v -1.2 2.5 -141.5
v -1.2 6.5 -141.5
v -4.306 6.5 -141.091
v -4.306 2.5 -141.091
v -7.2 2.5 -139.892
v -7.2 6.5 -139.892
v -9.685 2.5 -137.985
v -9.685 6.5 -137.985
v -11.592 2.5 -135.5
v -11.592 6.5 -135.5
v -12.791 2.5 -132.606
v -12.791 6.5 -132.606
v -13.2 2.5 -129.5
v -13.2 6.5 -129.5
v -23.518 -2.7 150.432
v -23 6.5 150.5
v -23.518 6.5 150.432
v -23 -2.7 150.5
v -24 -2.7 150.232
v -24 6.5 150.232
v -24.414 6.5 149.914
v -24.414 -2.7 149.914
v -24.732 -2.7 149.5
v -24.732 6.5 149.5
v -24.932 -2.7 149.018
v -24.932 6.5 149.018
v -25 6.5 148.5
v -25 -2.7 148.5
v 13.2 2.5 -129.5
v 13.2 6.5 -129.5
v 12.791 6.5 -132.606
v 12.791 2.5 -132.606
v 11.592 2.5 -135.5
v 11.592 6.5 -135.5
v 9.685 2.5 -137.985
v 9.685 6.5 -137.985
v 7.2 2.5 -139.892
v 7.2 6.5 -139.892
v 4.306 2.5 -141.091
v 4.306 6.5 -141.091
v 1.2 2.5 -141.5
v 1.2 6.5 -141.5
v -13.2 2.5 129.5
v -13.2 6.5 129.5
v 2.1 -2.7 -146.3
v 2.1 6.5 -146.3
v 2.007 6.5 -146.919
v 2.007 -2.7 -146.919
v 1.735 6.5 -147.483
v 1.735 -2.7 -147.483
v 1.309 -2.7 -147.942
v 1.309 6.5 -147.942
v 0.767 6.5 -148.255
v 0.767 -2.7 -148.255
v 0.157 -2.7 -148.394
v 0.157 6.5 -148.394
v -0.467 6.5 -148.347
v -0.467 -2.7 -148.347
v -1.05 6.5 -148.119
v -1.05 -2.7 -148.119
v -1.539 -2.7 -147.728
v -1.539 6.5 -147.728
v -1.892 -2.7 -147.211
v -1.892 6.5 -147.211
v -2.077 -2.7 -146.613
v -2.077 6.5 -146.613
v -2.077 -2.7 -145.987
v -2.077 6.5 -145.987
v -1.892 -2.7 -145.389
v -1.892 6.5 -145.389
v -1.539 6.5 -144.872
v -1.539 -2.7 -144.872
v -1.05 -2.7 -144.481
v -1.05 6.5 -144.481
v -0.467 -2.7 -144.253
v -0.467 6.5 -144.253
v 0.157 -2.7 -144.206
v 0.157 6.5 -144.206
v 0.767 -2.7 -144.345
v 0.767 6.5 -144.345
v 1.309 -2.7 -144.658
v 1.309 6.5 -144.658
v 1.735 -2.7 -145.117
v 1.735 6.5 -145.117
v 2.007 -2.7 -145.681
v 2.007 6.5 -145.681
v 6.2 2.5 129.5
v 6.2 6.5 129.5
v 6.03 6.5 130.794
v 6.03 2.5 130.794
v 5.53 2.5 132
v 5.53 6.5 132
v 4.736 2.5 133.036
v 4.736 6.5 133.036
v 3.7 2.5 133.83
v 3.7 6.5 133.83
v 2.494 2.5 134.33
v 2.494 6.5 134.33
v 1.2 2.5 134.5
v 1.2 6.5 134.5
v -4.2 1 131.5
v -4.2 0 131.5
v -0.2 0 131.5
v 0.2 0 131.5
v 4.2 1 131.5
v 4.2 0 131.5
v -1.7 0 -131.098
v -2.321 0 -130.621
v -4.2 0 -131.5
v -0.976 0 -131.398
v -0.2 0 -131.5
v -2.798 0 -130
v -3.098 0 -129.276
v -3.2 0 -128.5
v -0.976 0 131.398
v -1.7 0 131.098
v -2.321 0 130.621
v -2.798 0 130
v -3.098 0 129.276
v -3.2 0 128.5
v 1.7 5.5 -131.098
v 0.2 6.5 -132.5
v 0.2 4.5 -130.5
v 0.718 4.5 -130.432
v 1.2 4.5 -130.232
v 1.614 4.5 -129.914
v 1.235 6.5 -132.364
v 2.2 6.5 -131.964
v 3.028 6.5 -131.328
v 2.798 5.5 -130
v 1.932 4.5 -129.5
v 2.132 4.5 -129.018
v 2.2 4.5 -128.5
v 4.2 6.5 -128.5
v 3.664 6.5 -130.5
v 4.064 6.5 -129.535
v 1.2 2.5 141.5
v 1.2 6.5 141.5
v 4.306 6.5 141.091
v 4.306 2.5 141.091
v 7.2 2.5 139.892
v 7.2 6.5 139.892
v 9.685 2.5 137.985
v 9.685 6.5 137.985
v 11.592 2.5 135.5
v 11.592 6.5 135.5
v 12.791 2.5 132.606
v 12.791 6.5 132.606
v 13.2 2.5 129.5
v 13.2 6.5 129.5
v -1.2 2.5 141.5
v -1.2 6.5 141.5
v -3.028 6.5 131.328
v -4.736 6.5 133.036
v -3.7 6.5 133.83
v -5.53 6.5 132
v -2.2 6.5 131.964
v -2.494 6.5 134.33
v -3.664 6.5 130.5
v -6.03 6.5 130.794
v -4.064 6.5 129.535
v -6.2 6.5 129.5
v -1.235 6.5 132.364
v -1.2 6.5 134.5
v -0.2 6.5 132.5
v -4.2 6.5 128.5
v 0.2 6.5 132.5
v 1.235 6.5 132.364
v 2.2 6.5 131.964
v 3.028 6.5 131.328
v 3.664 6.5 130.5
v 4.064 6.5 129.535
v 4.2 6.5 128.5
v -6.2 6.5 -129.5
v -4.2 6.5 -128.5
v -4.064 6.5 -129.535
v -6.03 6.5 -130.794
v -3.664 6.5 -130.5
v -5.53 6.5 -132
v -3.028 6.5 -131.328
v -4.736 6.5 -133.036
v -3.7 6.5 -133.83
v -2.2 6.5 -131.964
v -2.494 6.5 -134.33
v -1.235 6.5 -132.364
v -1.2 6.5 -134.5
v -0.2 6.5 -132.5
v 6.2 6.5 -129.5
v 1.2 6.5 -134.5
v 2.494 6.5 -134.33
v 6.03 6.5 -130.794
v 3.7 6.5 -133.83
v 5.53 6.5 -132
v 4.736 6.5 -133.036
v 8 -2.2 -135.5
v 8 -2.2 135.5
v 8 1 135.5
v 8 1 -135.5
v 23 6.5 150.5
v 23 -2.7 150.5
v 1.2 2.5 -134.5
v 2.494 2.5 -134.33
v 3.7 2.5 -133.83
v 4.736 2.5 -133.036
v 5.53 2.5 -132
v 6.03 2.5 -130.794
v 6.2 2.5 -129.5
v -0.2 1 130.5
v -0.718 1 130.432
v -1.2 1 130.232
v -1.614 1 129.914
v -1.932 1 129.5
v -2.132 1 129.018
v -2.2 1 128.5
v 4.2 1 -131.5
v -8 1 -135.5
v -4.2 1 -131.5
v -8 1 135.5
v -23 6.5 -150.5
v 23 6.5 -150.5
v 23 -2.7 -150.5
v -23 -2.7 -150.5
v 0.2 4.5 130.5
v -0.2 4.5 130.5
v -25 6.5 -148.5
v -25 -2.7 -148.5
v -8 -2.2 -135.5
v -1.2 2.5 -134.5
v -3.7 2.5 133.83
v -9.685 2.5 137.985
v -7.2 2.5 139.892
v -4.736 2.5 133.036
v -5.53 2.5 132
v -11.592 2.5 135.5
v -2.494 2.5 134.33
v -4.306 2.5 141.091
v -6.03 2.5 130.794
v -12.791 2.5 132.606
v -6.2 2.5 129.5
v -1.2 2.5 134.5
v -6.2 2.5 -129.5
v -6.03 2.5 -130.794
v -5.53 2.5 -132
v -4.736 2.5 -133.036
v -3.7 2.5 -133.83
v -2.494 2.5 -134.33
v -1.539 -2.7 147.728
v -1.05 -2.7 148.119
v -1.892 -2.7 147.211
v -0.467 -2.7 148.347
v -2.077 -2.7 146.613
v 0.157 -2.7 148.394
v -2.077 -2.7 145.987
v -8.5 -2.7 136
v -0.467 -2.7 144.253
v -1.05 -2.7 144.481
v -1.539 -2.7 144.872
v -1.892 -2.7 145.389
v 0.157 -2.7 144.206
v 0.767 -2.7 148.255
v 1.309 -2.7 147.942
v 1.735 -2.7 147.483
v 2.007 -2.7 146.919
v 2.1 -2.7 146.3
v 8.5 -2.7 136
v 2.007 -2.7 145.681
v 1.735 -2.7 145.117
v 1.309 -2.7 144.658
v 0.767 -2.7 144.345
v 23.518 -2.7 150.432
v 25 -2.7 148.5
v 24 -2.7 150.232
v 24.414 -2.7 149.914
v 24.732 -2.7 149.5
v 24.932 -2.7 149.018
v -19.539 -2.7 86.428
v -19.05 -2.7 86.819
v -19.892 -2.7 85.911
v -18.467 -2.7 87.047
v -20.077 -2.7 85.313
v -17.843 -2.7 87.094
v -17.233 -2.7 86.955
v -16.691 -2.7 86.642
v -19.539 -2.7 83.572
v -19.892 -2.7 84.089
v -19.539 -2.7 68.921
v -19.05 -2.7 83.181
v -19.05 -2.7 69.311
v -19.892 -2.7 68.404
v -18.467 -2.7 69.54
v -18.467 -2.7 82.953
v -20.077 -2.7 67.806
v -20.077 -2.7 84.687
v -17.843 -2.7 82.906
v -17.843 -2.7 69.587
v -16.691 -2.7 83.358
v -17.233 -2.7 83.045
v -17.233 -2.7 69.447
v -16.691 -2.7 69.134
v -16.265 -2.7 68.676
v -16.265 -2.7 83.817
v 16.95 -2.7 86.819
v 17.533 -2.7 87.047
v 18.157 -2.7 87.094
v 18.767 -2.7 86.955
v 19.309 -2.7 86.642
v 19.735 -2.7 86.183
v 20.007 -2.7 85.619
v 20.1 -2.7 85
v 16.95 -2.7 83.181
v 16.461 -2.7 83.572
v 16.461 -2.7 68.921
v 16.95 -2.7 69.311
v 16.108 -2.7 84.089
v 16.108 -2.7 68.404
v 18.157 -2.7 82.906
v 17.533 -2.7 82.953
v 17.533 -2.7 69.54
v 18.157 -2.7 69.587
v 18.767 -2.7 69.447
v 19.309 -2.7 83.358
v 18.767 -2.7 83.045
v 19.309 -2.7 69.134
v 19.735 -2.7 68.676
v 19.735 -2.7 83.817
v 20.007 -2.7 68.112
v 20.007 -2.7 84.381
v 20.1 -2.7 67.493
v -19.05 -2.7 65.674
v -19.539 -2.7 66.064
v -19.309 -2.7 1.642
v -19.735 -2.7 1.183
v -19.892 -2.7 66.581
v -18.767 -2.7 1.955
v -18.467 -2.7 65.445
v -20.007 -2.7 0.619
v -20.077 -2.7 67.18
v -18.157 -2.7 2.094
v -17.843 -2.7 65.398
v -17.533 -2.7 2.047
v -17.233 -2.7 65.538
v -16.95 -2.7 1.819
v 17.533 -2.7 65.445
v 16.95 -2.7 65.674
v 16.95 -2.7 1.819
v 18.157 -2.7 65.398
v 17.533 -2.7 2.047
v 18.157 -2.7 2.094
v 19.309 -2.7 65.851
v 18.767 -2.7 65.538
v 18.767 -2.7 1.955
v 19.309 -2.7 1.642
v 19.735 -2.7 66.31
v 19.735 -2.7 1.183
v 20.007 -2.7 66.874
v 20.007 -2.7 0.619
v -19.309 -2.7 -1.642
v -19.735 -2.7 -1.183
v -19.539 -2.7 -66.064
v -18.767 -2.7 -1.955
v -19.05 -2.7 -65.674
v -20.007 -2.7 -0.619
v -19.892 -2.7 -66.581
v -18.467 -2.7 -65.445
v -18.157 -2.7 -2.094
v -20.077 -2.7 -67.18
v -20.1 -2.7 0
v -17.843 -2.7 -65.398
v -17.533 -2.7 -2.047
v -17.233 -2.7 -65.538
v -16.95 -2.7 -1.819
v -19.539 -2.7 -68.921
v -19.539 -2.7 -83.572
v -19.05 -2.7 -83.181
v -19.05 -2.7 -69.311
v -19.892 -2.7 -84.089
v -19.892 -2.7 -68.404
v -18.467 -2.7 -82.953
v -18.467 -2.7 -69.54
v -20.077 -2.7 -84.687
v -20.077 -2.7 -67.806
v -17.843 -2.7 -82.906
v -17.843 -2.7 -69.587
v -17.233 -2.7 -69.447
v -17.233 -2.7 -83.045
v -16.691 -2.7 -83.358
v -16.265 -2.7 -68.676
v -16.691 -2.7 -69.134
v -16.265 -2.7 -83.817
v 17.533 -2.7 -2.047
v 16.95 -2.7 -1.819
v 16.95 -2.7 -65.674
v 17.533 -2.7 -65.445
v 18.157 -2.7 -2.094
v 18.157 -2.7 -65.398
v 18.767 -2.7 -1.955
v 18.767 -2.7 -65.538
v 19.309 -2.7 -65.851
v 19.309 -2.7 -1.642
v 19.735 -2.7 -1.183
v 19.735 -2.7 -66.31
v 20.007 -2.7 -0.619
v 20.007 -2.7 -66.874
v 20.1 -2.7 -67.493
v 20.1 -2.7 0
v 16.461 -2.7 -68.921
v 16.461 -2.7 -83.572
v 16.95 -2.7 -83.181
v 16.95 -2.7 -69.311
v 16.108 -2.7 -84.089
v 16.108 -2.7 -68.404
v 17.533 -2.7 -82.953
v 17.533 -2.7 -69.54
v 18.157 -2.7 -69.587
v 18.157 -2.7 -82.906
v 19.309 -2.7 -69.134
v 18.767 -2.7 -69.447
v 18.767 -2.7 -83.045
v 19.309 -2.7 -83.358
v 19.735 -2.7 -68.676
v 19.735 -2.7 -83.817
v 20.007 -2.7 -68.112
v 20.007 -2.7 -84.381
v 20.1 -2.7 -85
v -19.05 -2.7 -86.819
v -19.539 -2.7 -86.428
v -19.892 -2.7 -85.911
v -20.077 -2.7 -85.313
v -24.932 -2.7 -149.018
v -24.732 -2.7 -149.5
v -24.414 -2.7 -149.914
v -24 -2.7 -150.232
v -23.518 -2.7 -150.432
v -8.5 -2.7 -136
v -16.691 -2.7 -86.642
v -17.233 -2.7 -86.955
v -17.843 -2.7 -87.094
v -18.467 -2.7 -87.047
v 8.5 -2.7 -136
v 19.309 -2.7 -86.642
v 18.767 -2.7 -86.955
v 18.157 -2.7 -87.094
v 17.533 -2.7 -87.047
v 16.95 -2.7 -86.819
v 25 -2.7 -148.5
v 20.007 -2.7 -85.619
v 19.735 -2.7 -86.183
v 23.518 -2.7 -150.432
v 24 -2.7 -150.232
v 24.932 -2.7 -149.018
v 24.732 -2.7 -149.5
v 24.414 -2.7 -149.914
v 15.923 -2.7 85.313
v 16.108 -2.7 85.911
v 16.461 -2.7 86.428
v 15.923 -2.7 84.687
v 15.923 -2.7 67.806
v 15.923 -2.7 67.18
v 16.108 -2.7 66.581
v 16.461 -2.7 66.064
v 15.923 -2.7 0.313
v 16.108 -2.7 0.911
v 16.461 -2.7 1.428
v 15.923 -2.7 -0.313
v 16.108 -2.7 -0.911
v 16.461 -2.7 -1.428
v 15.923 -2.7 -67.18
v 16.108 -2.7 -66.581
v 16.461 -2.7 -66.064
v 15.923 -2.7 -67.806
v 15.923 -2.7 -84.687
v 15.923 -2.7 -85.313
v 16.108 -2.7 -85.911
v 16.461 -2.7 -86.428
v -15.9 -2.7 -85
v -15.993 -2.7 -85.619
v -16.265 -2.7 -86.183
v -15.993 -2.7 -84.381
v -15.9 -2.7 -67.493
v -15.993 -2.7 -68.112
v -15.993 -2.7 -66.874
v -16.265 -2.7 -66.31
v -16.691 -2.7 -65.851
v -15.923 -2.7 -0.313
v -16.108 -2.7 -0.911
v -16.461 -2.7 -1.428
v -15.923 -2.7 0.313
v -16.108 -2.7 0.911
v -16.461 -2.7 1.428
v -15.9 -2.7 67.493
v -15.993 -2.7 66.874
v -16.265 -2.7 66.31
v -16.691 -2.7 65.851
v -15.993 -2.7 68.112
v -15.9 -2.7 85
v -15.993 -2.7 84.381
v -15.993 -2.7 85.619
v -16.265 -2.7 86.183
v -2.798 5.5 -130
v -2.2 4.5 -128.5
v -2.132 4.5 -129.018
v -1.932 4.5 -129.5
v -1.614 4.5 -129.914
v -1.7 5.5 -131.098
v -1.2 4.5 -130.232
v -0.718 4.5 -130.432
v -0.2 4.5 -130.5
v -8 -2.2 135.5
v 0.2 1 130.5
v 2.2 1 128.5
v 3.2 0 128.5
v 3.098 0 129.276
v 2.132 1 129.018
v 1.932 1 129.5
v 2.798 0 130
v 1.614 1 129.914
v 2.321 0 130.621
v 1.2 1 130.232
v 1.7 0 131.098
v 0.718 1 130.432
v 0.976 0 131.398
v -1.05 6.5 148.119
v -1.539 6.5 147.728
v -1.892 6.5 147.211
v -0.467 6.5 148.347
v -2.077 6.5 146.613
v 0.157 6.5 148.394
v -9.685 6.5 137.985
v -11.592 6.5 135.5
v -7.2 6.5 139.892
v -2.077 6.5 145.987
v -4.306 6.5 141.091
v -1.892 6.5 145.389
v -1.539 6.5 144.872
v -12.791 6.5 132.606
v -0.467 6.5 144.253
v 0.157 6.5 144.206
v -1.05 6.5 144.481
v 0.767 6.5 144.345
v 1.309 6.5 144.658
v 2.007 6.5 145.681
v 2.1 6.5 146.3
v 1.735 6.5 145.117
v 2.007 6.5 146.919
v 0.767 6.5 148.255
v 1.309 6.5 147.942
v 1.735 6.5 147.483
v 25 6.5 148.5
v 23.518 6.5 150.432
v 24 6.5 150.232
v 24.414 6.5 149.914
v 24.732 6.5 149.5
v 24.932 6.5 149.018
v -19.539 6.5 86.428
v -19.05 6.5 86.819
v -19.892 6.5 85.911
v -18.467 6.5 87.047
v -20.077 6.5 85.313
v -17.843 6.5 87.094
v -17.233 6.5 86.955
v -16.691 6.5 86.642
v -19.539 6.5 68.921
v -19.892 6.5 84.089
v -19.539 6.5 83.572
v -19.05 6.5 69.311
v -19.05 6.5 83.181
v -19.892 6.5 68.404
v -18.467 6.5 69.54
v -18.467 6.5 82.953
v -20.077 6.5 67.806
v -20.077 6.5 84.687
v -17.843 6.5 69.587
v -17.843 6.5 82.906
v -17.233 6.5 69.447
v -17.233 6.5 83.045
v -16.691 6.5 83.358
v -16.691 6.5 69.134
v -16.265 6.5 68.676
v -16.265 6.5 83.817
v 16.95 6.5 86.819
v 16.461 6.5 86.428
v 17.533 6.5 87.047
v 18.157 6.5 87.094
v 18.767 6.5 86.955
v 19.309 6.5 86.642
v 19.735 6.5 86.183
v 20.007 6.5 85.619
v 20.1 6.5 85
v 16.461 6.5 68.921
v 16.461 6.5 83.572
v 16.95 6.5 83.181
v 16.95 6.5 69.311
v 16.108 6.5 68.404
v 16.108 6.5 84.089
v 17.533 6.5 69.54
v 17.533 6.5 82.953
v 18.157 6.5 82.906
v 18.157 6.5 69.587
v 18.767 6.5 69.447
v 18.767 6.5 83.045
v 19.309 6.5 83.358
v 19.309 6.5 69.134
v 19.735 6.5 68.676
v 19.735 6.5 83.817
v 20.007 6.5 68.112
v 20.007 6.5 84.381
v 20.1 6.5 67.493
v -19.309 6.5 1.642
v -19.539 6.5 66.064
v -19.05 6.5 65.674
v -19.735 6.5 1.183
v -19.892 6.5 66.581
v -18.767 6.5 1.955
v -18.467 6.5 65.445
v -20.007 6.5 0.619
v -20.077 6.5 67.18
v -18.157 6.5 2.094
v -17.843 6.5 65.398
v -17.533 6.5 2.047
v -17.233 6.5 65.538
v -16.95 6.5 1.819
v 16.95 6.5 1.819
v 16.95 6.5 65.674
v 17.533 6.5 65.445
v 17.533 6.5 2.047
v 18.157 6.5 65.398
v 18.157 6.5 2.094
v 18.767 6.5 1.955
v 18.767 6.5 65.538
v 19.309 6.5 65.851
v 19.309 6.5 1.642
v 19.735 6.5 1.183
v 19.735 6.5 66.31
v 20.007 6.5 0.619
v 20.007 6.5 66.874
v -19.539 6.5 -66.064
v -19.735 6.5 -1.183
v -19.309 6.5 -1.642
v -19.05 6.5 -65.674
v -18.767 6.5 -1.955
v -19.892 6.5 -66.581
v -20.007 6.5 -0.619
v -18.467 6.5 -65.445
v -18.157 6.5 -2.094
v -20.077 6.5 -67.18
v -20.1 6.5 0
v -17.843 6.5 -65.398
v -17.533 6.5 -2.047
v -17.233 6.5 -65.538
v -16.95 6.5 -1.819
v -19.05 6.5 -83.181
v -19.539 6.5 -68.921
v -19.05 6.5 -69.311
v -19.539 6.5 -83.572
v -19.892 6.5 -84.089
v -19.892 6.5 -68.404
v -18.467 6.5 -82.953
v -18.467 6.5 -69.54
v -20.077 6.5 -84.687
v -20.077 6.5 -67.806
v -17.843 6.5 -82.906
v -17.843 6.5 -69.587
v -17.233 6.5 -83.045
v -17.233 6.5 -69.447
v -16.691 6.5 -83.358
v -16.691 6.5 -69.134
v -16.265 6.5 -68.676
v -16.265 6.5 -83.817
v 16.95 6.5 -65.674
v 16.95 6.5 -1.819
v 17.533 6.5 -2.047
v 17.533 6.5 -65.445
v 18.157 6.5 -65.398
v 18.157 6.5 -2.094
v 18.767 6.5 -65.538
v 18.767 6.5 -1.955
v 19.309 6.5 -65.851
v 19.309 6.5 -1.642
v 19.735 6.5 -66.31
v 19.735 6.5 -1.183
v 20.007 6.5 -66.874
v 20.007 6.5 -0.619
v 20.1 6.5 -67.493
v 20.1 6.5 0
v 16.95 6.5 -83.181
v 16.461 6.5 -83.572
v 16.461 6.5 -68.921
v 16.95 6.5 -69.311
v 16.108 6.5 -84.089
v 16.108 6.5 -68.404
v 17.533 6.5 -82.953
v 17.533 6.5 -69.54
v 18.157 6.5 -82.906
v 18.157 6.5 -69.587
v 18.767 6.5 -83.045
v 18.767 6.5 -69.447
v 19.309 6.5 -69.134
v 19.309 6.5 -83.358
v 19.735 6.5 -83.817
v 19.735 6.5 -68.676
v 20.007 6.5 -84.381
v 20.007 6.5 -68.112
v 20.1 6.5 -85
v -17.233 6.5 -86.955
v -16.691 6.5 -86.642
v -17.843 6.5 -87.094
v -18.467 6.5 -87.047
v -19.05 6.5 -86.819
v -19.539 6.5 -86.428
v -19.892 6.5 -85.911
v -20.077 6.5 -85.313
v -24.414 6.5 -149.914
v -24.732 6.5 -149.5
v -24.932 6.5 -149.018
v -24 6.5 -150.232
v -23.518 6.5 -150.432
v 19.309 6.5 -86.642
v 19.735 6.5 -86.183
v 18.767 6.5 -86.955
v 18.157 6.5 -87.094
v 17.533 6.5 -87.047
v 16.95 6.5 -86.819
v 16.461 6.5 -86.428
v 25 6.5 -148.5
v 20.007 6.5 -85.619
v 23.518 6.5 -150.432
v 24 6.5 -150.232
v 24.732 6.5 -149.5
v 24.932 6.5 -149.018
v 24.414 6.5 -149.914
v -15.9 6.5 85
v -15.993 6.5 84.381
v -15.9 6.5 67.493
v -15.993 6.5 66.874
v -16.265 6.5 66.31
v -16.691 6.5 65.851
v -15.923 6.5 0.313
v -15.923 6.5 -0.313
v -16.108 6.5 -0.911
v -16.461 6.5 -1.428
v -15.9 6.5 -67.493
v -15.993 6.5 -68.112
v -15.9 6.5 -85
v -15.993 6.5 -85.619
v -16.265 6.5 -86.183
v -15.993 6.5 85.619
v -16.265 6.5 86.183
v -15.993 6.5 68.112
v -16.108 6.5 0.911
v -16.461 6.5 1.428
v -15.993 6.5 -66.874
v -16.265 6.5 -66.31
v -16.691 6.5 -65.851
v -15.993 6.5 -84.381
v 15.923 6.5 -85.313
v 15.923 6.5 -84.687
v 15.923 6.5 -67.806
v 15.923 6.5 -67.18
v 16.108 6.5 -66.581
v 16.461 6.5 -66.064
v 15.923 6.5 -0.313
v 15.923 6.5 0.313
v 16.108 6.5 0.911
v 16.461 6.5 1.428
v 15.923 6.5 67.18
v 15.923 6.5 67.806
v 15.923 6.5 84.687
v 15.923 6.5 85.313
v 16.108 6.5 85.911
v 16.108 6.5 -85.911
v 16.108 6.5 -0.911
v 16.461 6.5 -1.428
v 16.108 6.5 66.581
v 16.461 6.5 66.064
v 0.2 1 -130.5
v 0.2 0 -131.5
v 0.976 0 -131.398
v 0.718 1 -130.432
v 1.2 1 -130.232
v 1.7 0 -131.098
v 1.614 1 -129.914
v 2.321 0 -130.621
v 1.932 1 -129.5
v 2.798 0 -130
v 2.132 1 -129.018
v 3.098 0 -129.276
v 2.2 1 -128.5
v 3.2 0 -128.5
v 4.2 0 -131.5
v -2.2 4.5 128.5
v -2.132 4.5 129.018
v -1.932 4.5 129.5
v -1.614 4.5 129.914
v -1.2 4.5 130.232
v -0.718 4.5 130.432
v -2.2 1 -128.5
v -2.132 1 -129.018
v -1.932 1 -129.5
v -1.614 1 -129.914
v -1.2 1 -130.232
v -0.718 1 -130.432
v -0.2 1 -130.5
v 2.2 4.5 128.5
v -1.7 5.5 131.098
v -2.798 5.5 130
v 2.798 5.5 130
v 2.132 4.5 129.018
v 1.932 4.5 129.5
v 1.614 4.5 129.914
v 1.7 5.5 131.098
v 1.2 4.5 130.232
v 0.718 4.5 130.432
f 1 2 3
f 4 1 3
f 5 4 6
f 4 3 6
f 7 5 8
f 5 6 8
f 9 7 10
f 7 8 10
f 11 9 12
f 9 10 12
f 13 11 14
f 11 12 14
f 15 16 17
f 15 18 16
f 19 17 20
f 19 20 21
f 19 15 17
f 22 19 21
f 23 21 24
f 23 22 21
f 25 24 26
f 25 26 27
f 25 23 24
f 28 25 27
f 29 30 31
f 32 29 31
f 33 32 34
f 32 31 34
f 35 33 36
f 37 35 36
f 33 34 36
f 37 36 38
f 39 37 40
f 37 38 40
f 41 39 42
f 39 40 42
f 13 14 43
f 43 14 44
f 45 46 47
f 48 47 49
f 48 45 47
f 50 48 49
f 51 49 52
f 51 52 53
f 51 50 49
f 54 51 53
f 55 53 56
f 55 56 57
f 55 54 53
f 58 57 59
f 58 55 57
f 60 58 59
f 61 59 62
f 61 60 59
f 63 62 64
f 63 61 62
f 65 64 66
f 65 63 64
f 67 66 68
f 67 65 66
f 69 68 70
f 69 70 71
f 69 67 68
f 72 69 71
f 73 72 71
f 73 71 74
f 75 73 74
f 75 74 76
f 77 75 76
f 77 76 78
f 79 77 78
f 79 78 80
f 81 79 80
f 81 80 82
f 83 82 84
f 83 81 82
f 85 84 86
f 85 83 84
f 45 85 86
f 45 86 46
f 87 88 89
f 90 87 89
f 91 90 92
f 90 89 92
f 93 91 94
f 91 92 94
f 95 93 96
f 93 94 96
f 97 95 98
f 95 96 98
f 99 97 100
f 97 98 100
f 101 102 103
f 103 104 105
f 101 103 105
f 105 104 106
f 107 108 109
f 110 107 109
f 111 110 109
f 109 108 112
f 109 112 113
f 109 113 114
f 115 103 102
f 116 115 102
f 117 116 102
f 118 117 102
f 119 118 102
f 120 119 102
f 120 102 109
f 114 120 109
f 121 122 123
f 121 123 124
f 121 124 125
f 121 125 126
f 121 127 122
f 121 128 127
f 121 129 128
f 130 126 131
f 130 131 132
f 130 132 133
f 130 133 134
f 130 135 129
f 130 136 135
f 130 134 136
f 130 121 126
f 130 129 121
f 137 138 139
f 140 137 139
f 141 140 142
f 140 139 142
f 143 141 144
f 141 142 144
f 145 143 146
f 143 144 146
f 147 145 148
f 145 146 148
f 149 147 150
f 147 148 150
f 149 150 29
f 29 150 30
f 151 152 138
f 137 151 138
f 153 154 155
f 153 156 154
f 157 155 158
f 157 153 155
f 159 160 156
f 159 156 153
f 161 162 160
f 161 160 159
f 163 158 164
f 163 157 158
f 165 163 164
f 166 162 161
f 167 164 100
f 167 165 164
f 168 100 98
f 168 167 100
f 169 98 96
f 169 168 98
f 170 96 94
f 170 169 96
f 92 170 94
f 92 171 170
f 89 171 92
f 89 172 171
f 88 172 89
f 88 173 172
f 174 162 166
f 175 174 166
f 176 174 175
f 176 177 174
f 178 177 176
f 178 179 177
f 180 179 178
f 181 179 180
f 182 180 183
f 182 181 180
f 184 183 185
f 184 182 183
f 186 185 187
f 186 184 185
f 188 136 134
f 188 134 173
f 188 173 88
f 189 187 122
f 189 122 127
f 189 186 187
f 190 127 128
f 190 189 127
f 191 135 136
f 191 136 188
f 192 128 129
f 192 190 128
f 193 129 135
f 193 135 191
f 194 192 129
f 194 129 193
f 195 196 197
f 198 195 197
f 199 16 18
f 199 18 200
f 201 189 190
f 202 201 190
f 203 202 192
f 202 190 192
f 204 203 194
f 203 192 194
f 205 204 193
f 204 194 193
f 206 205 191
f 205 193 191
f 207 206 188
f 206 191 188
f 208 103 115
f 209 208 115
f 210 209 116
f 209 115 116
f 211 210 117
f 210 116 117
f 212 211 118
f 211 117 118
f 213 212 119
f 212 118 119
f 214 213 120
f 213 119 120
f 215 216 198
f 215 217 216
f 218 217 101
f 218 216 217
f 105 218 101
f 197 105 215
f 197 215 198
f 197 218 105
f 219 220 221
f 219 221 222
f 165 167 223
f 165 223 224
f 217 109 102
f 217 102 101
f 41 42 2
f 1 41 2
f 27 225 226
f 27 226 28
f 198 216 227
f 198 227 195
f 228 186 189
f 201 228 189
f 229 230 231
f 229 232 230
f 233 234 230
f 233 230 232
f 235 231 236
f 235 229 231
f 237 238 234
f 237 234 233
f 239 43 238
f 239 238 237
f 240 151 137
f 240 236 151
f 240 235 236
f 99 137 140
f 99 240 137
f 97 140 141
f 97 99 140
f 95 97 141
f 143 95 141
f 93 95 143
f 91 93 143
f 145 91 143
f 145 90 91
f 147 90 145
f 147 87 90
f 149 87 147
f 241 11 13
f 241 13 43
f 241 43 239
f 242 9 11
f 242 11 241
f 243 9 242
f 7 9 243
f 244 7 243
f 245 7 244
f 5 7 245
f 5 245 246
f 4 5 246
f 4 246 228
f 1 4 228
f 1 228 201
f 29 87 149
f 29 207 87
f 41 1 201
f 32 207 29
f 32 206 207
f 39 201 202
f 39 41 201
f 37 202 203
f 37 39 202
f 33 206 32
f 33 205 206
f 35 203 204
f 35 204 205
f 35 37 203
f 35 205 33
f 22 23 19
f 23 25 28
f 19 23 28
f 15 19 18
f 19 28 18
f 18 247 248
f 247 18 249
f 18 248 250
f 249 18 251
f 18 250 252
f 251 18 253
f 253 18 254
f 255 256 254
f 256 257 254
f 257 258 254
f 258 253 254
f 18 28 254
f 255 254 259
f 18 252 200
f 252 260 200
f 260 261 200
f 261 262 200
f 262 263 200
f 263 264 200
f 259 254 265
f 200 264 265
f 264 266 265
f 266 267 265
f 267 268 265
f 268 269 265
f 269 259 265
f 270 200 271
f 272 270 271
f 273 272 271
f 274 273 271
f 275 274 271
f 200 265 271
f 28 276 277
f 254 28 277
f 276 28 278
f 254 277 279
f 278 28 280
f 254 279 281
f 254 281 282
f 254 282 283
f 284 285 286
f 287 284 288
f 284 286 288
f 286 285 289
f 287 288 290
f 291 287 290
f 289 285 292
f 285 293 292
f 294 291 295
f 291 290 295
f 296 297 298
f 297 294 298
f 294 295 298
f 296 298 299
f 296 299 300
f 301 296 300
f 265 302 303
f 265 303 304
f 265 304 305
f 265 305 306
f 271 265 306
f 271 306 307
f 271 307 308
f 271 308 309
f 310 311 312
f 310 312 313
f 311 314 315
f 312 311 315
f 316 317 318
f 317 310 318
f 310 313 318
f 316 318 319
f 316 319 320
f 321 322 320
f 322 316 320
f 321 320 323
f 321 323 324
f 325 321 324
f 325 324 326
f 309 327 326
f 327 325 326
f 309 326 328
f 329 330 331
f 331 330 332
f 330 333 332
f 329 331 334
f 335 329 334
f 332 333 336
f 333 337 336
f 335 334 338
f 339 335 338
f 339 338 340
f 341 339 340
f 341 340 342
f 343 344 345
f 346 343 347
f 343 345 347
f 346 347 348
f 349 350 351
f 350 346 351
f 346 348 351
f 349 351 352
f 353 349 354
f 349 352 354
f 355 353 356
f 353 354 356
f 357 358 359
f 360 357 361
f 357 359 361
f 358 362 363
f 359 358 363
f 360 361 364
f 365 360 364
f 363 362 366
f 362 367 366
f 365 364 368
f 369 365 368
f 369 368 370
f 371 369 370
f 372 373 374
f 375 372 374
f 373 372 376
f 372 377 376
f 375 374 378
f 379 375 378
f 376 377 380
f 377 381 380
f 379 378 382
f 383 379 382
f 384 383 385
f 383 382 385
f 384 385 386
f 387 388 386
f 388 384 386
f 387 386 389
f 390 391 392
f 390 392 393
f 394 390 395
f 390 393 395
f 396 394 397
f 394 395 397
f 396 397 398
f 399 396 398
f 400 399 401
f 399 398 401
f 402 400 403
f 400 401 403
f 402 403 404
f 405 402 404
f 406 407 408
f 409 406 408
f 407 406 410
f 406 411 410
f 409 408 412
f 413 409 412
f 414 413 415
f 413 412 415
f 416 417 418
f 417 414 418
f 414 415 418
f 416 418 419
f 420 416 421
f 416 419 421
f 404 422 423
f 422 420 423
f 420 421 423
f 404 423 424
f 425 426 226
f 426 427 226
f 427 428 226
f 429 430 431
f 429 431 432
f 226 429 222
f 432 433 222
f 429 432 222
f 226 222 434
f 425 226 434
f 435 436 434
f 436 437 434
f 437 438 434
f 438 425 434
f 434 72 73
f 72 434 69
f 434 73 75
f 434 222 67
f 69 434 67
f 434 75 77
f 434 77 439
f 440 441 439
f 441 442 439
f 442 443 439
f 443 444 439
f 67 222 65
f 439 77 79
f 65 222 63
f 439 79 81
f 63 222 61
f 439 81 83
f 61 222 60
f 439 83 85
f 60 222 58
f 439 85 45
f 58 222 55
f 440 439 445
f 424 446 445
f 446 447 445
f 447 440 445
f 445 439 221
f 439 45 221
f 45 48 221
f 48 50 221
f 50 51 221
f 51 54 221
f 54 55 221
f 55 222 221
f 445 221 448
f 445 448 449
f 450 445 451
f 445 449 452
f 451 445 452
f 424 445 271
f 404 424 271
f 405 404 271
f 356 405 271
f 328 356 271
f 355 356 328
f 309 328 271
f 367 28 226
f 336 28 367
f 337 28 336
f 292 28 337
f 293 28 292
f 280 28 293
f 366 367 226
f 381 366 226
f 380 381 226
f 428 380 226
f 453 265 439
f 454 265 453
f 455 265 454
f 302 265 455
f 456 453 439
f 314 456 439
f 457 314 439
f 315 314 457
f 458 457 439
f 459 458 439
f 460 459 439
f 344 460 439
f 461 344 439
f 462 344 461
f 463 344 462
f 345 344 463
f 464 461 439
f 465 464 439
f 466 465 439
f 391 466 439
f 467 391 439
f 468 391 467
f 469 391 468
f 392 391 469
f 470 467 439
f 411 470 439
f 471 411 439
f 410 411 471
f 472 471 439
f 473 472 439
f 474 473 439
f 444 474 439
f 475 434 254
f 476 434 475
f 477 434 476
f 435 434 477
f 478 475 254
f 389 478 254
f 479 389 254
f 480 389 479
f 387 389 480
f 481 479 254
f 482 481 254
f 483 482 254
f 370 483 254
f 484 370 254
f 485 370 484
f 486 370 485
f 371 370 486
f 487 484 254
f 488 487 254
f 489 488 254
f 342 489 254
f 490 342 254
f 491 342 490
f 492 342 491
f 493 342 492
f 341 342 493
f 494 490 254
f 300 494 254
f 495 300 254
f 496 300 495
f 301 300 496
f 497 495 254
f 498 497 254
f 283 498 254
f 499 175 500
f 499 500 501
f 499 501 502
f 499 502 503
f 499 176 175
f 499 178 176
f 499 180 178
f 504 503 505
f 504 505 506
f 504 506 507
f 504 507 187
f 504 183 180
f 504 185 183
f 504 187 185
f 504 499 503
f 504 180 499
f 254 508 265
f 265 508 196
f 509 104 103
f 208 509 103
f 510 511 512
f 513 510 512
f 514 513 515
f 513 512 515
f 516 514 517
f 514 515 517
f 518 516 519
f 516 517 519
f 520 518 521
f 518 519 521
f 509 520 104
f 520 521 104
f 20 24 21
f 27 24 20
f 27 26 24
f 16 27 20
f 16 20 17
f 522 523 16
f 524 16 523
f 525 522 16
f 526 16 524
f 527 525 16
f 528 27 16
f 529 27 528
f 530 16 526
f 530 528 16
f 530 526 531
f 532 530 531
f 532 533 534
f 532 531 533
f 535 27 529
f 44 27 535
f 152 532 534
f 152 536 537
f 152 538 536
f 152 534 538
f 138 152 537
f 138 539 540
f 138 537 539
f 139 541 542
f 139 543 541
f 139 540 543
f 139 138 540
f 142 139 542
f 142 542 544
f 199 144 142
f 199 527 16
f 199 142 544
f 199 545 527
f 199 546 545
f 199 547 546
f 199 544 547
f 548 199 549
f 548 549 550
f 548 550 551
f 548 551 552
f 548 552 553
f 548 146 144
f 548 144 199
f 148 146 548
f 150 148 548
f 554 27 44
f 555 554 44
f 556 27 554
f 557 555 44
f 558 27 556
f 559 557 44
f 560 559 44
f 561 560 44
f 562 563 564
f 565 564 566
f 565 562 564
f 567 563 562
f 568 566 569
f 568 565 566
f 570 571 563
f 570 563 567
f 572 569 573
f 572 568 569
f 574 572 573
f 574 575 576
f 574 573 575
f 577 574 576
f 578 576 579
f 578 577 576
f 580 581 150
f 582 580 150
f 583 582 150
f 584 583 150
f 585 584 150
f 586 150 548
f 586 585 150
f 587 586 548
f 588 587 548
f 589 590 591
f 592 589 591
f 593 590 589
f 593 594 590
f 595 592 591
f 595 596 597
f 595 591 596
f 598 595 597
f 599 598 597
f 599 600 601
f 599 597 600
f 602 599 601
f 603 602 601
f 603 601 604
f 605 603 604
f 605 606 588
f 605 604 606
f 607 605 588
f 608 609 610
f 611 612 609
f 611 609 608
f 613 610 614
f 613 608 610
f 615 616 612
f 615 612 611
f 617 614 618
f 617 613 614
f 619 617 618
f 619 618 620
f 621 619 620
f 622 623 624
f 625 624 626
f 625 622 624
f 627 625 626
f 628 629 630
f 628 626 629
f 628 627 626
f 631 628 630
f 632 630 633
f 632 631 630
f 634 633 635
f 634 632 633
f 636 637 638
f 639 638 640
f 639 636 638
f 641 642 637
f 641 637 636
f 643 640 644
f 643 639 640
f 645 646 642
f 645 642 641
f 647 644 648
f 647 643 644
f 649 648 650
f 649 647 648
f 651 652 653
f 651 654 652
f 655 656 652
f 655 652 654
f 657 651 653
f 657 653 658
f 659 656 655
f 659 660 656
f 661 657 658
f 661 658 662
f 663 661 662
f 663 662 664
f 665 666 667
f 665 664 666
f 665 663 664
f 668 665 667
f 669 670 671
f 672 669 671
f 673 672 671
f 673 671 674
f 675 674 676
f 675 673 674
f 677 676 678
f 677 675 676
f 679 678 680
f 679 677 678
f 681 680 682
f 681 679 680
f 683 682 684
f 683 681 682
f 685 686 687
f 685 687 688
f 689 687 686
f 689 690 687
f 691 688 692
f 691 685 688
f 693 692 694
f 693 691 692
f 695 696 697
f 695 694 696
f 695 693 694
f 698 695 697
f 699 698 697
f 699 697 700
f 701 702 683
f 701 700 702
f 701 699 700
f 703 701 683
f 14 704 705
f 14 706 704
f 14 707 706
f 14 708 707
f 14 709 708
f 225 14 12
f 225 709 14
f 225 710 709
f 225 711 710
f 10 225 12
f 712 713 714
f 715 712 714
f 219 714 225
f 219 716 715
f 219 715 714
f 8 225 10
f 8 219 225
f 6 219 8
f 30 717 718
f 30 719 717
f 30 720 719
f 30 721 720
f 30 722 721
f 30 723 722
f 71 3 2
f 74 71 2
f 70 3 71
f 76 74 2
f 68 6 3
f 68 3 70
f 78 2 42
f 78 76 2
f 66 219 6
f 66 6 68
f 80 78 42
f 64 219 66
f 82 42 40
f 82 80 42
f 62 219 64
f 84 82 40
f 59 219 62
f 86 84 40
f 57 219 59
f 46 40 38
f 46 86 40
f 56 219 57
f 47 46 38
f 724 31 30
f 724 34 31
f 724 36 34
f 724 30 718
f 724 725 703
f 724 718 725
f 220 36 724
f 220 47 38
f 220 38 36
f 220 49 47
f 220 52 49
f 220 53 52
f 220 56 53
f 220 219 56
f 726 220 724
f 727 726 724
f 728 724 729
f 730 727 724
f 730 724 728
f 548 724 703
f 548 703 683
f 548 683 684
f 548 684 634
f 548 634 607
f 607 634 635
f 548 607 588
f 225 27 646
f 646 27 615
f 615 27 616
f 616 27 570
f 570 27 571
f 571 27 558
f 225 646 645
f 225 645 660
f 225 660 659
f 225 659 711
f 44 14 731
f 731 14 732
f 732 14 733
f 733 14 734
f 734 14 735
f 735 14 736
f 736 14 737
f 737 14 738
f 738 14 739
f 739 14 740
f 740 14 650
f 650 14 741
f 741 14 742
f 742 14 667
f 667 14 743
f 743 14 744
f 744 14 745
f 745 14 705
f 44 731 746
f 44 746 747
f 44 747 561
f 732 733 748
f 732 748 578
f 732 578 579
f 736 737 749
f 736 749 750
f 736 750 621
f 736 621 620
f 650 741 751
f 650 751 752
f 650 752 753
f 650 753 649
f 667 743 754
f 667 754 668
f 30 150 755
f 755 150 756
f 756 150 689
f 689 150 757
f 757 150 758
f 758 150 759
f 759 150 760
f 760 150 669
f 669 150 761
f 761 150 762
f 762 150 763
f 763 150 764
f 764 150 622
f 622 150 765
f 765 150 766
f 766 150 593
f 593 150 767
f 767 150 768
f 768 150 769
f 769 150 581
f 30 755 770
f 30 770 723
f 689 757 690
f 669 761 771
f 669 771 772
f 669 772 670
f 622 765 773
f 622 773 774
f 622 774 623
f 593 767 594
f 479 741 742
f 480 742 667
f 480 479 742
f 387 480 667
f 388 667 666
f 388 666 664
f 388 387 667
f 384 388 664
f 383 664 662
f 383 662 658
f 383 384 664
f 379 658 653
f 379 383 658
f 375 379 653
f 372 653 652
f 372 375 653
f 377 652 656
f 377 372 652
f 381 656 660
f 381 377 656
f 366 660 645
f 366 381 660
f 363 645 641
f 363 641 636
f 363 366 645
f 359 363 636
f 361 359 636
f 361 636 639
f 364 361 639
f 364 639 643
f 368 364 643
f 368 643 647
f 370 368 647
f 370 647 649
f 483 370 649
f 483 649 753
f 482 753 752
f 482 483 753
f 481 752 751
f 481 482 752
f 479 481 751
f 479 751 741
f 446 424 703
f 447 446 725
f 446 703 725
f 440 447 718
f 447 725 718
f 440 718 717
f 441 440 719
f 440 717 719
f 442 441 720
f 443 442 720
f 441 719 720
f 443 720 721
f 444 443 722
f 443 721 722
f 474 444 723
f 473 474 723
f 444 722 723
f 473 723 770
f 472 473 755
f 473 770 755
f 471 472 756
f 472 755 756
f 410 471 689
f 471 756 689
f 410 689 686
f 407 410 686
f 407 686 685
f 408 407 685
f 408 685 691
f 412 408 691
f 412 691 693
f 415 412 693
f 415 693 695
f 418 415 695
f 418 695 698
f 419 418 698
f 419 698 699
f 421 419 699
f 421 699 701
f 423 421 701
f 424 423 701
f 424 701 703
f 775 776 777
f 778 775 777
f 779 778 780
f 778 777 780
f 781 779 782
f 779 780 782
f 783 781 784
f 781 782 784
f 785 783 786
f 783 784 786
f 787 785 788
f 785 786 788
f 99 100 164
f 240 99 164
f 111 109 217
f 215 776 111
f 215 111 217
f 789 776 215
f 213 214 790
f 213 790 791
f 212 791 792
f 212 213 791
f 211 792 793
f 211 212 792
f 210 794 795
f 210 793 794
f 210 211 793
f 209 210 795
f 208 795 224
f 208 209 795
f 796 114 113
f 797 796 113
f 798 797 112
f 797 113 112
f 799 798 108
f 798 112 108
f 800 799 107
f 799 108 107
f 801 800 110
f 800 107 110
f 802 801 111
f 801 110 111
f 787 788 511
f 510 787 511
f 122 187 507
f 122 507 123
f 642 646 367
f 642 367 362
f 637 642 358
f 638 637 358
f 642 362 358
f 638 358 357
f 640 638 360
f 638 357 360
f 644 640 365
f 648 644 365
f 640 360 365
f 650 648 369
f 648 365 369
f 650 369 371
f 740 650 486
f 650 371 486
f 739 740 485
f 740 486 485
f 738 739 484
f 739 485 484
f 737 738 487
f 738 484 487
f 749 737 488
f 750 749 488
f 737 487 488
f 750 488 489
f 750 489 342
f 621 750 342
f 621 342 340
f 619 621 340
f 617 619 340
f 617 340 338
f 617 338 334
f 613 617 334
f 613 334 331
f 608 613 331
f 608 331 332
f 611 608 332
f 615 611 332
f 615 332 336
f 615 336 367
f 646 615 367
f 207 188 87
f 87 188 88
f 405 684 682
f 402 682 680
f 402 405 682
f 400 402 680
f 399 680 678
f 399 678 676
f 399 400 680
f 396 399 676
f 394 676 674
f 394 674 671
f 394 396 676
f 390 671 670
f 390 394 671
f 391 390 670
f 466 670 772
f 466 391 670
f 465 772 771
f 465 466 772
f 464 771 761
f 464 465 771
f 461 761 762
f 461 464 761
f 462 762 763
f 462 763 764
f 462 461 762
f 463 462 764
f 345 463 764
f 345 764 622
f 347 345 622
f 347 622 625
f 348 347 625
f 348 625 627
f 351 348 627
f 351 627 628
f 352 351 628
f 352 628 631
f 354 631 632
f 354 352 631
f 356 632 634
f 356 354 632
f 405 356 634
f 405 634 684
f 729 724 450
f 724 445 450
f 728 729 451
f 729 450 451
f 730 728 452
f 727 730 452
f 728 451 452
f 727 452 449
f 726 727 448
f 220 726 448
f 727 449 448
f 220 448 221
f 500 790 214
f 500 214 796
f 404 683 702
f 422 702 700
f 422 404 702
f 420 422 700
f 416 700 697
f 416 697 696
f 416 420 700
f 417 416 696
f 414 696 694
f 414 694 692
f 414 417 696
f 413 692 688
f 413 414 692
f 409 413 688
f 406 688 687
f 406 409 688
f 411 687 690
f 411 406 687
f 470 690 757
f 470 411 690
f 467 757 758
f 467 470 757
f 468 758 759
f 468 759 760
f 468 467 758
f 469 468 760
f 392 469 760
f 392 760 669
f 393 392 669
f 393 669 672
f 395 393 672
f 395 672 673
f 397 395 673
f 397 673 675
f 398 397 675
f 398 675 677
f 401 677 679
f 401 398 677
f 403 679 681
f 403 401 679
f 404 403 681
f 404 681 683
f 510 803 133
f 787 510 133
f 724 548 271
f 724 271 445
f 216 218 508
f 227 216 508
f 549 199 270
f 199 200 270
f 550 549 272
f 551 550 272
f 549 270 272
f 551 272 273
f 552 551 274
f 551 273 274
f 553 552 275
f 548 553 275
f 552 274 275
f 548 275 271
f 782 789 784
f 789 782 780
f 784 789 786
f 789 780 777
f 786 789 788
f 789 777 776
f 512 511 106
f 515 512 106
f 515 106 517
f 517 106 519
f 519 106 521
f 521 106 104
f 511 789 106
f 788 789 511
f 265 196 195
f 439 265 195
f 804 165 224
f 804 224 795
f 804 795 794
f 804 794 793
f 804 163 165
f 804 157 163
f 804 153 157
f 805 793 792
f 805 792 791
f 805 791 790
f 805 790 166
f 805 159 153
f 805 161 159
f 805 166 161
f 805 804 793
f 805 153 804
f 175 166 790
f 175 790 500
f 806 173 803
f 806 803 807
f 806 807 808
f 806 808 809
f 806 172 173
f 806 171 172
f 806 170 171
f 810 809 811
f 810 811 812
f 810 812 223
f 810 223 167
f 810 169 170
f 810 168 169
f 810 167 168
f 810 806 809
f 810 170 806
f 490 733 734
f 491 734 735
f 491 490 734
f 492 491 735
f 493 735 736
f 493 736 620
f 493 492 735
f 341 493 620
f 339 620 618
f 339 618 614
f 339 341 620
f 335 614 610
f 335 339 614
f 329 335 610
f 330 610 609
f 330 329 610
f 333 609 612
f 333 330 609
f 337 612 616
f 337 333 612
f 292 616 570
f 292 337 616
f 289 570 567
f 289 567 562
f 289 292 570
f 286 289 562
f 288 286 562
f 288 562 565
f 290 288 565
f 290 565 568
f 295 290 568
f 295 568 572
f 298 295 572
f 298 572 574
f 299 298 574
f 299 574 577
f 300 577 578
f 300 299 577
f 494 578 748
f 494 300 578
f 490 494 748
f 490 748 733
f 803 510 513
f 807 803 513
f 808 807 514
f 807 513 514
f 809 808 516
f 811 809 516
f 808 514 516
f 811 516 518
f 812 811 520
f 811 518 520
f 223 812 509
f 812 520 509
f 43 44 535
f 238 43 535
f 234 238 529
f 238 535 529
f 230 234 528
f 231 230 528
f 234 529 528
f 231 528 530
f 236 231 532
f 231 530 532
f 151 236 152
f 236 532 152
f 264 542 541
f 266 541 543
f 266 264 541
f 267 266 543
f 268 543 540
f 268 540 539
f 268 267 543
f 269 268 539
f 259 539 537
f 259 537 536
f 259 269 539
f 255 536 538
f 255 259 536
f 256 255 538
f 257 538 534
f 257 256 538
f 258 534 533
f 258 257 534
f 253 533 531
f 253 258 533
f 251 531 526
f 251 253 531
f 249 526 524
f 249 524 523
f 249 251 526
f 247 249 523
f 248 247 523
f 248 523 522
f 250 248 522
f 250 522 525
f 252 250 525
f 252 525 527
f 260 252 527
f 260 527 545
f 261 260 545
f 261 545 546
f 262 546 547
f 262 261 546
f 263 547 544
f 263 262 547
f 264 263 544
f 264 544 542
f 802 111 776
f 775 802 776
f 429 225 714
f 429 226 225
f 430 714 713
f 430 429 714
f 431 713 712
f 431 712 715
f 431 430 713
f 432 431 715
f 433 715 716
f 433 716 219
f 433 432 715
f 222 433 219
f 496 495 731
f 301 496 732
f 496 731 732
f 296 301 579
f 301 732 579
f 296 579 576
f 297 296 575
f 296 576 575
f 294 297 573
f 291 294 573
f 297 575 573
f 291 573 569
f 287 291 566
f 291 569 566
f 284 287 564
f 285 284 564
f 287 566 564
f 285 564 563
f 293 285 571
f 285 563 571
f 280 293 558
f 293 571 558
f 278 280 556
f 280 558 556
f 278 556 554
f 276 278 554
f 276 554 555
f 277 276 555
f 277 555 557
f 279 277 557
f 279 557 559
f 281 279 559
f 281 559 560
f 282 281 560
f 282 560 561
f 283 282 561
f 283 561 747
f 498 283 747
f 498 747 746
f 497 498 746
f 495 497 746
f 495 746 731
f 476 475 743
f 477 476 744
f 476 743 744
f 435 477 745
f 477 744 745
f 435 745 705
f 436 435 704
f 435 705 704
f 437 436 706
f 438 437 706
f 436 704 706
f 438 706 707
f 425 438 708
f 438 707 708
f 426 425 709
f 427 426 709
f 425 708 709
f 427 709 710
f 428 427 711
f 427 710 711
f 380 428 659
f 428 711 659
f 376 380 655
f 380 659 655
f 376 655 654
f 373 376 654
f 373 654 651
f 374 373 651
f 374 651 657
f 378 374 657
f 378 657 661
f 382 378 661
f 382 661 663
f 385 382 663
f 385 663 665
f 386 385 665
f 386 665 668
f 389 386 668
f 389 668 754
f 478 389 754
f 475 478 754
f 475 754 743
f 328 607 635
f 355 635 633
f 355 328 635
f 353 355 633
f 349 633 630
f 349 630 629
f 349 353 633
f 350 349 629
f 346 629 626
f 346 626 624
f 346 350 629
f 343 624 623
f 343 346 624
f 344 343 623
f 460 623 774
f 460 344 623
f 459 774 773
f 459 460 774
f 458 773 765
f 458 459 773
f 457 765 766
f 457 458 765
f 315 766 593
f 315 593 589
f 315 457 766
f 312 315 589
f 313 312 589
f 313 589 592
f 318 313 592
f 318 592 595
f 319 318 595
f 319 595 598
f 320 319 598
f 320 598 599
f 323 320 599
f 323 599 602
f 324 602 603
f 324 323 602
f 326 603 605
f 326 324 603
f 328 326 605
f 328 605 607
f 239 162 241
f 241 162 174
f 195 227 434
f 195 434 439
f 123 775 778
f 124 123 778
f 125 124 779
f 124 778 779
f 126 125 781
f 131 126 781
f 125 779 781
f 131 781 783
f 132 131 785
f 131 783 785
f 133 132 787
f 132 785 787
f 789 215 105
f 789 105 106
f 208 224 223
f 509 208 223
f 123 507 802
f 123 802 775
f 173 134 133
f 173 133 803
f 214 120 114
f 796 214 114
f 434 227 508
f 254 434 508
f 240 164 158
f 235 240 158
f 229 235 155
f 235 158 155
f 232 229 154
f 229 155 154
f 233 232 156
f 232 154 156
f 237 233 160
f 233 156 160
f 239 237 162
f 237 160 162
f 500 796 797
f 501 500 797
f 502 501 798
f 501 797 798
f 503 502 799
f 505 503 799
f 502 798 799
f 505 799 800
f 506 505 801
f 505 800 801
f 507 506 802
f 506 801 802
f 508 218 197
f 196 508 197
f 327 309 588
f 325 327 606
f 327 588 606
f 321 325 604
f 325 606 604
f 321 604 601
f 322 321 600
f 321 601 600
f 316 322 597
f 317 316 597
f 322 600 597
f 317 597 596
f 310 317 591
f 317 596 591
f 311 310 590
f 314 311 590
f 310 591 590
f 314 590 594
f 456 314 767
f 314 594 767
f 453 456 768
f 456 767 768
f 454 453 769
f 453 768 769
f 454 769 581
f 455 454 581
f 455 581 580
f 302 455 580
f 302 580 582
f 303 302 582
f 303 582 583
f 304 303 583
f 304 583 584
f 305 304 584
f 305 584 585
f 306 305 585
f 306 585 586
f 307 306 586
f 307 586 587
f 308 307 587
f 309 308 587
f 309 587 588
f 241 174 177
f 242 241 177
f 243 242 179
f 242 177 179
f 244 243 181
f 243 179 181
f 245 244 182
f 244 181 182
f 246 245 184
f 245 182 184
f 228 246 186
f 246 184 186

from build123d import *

# Parameters (mm, degrees)
BOSS_EXTRUDE1_DEPTH   = 137.5
SKETCH3_W             = 20
SKETCH3_H             = 9.2
BOSS_EXTRUDE2_DEPTH   = 2
SKETCH2_W             = 4.4
SKETCH2_H             = 261
CUT_EXTRUDE1_DEPTH    = 139.169786857
FILLET3_R             = 2
CHAMFER1_SIZE         = 1
SKETCH4_W             = 10.203047284
SKETCH4_H             = 4
CUT_EXTRUDE2_DEPTH    = 1
CHAMFER4_SIZE         = 2
SKETCH5_W             = 20
SKETCH5_H             = 275
BOSS_EXTRUDE3_DEPTH   = 9.2
M5_TAPPED_HOLE1_D     = 4.2
CRVPATTERN1_START     = -2.7
CRVPATTERN1_OUTLINE_R = 2.1
CRVPATTERN1_DEPTH     = 9.2
CUT_EXTRUDE3_DEPTH    = 4
M5_TAPPED_HOLE2_D     = 4.2
M5_TAPPED_HOLE2_DEPTH = 11.1381927
M5_TAPPED_HOLE2_TIP   = 1.2618073
FILLET4_R             = 2
CHAMFER5_SIZE         = 0.5


# Read off the part's stored shape, not the designer's step: CrvPattern1
with BuildPart() as part:
    # Sketch1 → Boss-Extrude1 (new, symmetric)
    with BuildSketch(Plane.XY):
        Polygon((-10, -2.7), (-10, 6.5), (10, 6.5), (10, -2.7), (8, -2.7), (8, 1), (4.2, 1), (4.2, 0), (-4.2, 0), (-4.2, 1), (-8, 1), (-8, -2.7), align=None)
    extrude(amount=BOSS_EXTRUDE1_DEPTH, both=True)

    # Sketch3 → Boss-Extrude2 (add)
    with BuildSketch(Plane.XY.offset(137.5)):
        with Locations((0, 1.9)):
            Rectangle(SKETCH3_W, SKETCH3_H)
    boss_extrude2 = extrude(amount=-BOSS_EXTRUDE2_DEPTH)

    # Mirror1: Boss-Extrude2 across plane
    add(boss_extrude2.mirror(Plane.XY))

    # Sketch2 → Cut-Extrude1 (cut, through all)
    with BuildSketch(Plane(origin=(0, 6.5, 0), x_dir=(1, 0, 0), z_dir=(0, 1, 0))):
        Rectangle(SKETCH2_W, SKETCH2_H)
    extrude(amount=-CUT_EXTRUDE1_DEPTH, mode=Mode.SUBTRACT)

    # Fillet3
    fillet3_edges = [part.edges().sort_by_distance(p)[0] for p in [
        (2.2, 3.25, -130.5),
        (2.2, 3.25, 130.5),
        (-2.2, 3.25, 130.5),
        (-2.2, 3.25, -130.5),
    ]]
    fillet(fillet3_edges, radius=FILLET3_R)

    # Chamfer1
    chamfer1_edges = [part.edges().sort_by_distance(p)[0] for p in [
        (-2.2, 0, 0),
        (0, 0, -130.5),
        (2.2, 0, 0),
        (0, 0, 130.5),
        (-1.614213562, 0, -129.914213562),
        (1.614213562, 0, -129.914213562),
        (1.614213562, 0, 129.914213562),
        (-1.614213562, 0, 129.914213562),
    ]]
    chamfer(chamfer1_edges, length=CHAMFER1_SIZE)

    # Sketch4 → Cut-Extrude2 (cut)
    with BuildSketch(Plane.XZ):
        with Locations((-0.901523642, 133.5)):
            Rectangle(SKETCH4_W, SKETCH4_H)
    cut_extrude2 = extrude(amount=-CUT_EXTRUDE2_DEPTH, mode=Mode.SUBTRACT)

    # Mirror2: Cut-Extrude2 across plane
    add(cut_extrude2.mirror(Plane.XY), mode=Mode.SUBTRACT)

    # Chamfer4
    chamfer4_edges = [part.edges().sort_by_distance(p)[0] for p in [
        (-2.2, 6.5, 0),
        (0, 6.5, -130.5),
        (2.2, 6.5, 0),
        (0, 6.5, 130.5),
        (-1.614213562, 6.5, -129.914213562),
        (1.614213562, 6.5, -129.914213562),
        (1.614213562, 6.5, 129.914213562),
        (-1.614213562, 6.5, 129.914213562),
    ]]
    chamfer(chamfer4_edges, length=CHAMFER4_SIZE)

    # Sketch5 → Boss-Extrude3 (add)
    with BuildSketch(Plane(origin=(0, 6.5, 0), x_dir=(1, 0, 0), z_dir=(0, 1, 0))):
        Polygon((-25, 137.5), (-25, -137.5), (-25, -150.5), (25, -150.5), (25, -137.5), (25, 137.5), (25, 150.5), (-25, 150.5), align=None)
        Rectangle(SKETCH5_W, SKETCH5_H, mode=Mode.SUBTRACT)
    extrude(amount=-BOSS_EXTRUDE3_DEPTH)

    # M5 Tapped Hole1 (through all)
    with Locations(Plane(origin=(0, 6.5, 0), x_dir=(1, 0, 0), z_dir=(0, 1, 0))):
        with Locations((-18, 0)):
            Hole(M5_TAPPED_HOLE1_D / 2)

    # CrvPattern1 outline → CrvPattern1 (cut)
    with BuildSketch(Plane(origin=(0, 0, 0), x_dir=(1, 0, 0), z_dir=(0, 1, 0)).offset(CRVPATTERN1_START)):
        with Locations((-18, -67.49253334)):
            Circle(CRVPATTERN1_OUTLINE_R)
        with Locations((0, -146.3)):
            Circle(CRVPATTERN1_OUTLINE_R)
        with Locations((18, -67.49253334)):
            Circle(CRVPATTERN1_OUTLINE_R)
        with Locations((18, 0)):
            Circle(CRVPATTERN1_OUTLINE_R)
        with Locations((18, 67.49253334)):
            Circle(CRVPATTERN1_OUTLINE_R)
        with Locations((0, 146.3)):
            Circle(CRVPATTERN1_OUTLINE_R)
        with Locations((-18, 67.49253334)):
            Circle(CRVPATTERN1_OUTLINE_R)
    extrude(amount=CRVPATTERN1_DEPTH, mode=Mode.SUBTRACT)

    # Sketch9 → Cut-Extrude3 (cut)
    with BuildSketch(Plane(origin=(0, 6.5, 0), x_dir=(1, 0, 0), z_dir=(0, 1, 0))):
        with BuildLine():
            Line((-1.2, -141.5), (1.2, -141.5))
            ThreePointArc((1.2, -141.5), (9.685281374, -137.985281374), (13.2, -129.5))
            Line((13.2, -129.5), (13.2, 129.5))
            ThreePointArc((13.2, 129.5), (9.685281374, 137.985281374), (1.2, 141.5))
            Line((1.2, 141.5), (-1.2, 141.5))
            ThreePointArc((-1.2, 141.5), (-9.685281374, 137.985281374), (-13.2, 129.5))
            Line((-13.2, 129.5), (-13.2, -129.5))
            ThreePointArc((-13.2, -129.5), (-9.685281374, -137.985281374), (-1.2, -141.5))
        make_face()
        with BuildLine():
            Line((-6.2, -129.5), (-6.2, 129.5))
            ThreePointArc((-6.2, 129.5), (-4.735533906, 133.035533906), (-1.2, 134.5))
            Line((-1.2, 134.5), (1.2, 134.5))
            ThreePointArc((1.2, 134.5), (4.735533906, 133.035533906), (6.2, 129.5))
            Line((6.2, 129.5), (6.2, -129.5))
            ThreePointArc((6.2, -129.5), (4.735533906, -133.035533906), (1.2, -134.5))
            Line((1.2, -134.5), (-1.2, -134.5))
            ThreePointArc((-1.2, -134.5), (-4.735533906, -133.035533906), (-6.2, -129.5))
        make_face(mode=Mode.SUBTRACT)
    extrude(amount=-CUT_EXTRUDE3_DEPTH, mode=Mode.SUBTRACT)

    # M5 Tapped Hole2
    with Locations(Plane(origin=(0, -2.7, 0), x_dir=(-1, 0, 0), z_dir=(0, -1, 0))):
        with Locations((18, 85), (18, -85), (-18, -85), (-18, 85)):
            Hole(M5_TAPPED_HOLE2_D / 2, depth=M5_TAPPED_HOLE2_DEPTH)
            with Locations((0, 0, -(M5_TAPPED_HOLE2_DEPTH + M5_TAPPED_HOLE2_TIP / 2))):  # 118° drill point
                Cone(0, M5_TAPPED_HOLE2_D / 2, M5_TAPPED_HOLE2_TIP, mode=Mode.SUBTRACT)

    # Fillet4
    fillet4_edges = [part.edges().sort_by_distance(p)[0] for p in [
        (-25, 1.9, 150.5),
        (-25, 1.9, -150.5),
        (25, 1.9, -150.5),
        (25, 1.9, 150.5),
    ]]
    fillet(fillet4_edges, radius=FILLET4_R)

    # Chamfer5
    chamfer5_edges = [part.edges().sort_by_distance(p)[0] for p in [
        (8, -2.7, 0),
        (-8, -2.7, 0),
        (0, -2.7, 135.5),
        (0, -2.7, -135.5),
    ]]
    chamfer(chamfer5_edges, length=CHAMFER5_SIZE)


solid = part.part
